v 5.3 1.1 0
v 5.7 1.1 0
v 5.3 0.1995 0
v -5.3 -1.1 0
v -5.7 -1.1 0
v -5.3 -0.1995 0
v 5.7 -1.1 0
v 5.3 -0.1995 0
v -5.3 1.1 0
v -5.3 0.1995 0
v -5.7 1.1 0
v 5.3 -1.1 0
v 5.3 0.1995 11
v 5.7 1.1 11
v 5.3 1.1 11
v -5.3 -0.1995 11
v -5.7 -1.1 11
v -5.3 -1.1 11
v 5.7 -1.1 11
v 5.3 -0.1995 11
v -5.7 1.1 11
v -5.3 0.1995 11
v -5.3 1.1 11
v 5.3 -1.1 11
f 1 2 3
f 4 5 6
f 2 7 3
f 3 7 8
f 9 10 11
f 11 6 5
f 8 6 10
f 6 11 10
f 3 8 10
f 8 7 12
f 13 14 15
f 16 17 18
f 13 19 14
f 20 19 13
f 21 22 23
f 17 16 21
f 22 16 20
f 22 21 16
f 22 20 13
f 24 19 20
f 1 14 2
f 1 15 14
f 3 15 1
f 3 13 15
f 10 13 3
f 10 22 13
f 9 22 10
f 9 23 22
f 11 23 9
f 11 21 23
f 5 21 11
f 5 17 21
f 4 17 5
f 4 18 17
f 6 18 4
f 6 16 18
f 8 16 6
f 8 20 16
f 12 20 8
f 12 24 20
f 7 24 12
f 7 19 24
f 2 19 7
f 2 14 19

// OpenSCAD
//A part to repair my tiny card-reader. Not really useful or reusable
thickness=0.4;
width=11.4;
height=2.2;
depth=11;
bissl=1/1000;
*linear_extrude(depth)difference() {
  square([width,height],center=true);
  translate([0,thickness/2]) square([width-2*thickness,height-thickness+bissl],center=true);
}
linear_extrude(depth)difference() {
  square([width,height],center=true);
  translate([0,height/2]) square([width-2*thickness,height-thickness+bissl],center=true);
  translate([0,-height/2]) square([width-2*thickness,height-thickness+bissl],center=true);
}
